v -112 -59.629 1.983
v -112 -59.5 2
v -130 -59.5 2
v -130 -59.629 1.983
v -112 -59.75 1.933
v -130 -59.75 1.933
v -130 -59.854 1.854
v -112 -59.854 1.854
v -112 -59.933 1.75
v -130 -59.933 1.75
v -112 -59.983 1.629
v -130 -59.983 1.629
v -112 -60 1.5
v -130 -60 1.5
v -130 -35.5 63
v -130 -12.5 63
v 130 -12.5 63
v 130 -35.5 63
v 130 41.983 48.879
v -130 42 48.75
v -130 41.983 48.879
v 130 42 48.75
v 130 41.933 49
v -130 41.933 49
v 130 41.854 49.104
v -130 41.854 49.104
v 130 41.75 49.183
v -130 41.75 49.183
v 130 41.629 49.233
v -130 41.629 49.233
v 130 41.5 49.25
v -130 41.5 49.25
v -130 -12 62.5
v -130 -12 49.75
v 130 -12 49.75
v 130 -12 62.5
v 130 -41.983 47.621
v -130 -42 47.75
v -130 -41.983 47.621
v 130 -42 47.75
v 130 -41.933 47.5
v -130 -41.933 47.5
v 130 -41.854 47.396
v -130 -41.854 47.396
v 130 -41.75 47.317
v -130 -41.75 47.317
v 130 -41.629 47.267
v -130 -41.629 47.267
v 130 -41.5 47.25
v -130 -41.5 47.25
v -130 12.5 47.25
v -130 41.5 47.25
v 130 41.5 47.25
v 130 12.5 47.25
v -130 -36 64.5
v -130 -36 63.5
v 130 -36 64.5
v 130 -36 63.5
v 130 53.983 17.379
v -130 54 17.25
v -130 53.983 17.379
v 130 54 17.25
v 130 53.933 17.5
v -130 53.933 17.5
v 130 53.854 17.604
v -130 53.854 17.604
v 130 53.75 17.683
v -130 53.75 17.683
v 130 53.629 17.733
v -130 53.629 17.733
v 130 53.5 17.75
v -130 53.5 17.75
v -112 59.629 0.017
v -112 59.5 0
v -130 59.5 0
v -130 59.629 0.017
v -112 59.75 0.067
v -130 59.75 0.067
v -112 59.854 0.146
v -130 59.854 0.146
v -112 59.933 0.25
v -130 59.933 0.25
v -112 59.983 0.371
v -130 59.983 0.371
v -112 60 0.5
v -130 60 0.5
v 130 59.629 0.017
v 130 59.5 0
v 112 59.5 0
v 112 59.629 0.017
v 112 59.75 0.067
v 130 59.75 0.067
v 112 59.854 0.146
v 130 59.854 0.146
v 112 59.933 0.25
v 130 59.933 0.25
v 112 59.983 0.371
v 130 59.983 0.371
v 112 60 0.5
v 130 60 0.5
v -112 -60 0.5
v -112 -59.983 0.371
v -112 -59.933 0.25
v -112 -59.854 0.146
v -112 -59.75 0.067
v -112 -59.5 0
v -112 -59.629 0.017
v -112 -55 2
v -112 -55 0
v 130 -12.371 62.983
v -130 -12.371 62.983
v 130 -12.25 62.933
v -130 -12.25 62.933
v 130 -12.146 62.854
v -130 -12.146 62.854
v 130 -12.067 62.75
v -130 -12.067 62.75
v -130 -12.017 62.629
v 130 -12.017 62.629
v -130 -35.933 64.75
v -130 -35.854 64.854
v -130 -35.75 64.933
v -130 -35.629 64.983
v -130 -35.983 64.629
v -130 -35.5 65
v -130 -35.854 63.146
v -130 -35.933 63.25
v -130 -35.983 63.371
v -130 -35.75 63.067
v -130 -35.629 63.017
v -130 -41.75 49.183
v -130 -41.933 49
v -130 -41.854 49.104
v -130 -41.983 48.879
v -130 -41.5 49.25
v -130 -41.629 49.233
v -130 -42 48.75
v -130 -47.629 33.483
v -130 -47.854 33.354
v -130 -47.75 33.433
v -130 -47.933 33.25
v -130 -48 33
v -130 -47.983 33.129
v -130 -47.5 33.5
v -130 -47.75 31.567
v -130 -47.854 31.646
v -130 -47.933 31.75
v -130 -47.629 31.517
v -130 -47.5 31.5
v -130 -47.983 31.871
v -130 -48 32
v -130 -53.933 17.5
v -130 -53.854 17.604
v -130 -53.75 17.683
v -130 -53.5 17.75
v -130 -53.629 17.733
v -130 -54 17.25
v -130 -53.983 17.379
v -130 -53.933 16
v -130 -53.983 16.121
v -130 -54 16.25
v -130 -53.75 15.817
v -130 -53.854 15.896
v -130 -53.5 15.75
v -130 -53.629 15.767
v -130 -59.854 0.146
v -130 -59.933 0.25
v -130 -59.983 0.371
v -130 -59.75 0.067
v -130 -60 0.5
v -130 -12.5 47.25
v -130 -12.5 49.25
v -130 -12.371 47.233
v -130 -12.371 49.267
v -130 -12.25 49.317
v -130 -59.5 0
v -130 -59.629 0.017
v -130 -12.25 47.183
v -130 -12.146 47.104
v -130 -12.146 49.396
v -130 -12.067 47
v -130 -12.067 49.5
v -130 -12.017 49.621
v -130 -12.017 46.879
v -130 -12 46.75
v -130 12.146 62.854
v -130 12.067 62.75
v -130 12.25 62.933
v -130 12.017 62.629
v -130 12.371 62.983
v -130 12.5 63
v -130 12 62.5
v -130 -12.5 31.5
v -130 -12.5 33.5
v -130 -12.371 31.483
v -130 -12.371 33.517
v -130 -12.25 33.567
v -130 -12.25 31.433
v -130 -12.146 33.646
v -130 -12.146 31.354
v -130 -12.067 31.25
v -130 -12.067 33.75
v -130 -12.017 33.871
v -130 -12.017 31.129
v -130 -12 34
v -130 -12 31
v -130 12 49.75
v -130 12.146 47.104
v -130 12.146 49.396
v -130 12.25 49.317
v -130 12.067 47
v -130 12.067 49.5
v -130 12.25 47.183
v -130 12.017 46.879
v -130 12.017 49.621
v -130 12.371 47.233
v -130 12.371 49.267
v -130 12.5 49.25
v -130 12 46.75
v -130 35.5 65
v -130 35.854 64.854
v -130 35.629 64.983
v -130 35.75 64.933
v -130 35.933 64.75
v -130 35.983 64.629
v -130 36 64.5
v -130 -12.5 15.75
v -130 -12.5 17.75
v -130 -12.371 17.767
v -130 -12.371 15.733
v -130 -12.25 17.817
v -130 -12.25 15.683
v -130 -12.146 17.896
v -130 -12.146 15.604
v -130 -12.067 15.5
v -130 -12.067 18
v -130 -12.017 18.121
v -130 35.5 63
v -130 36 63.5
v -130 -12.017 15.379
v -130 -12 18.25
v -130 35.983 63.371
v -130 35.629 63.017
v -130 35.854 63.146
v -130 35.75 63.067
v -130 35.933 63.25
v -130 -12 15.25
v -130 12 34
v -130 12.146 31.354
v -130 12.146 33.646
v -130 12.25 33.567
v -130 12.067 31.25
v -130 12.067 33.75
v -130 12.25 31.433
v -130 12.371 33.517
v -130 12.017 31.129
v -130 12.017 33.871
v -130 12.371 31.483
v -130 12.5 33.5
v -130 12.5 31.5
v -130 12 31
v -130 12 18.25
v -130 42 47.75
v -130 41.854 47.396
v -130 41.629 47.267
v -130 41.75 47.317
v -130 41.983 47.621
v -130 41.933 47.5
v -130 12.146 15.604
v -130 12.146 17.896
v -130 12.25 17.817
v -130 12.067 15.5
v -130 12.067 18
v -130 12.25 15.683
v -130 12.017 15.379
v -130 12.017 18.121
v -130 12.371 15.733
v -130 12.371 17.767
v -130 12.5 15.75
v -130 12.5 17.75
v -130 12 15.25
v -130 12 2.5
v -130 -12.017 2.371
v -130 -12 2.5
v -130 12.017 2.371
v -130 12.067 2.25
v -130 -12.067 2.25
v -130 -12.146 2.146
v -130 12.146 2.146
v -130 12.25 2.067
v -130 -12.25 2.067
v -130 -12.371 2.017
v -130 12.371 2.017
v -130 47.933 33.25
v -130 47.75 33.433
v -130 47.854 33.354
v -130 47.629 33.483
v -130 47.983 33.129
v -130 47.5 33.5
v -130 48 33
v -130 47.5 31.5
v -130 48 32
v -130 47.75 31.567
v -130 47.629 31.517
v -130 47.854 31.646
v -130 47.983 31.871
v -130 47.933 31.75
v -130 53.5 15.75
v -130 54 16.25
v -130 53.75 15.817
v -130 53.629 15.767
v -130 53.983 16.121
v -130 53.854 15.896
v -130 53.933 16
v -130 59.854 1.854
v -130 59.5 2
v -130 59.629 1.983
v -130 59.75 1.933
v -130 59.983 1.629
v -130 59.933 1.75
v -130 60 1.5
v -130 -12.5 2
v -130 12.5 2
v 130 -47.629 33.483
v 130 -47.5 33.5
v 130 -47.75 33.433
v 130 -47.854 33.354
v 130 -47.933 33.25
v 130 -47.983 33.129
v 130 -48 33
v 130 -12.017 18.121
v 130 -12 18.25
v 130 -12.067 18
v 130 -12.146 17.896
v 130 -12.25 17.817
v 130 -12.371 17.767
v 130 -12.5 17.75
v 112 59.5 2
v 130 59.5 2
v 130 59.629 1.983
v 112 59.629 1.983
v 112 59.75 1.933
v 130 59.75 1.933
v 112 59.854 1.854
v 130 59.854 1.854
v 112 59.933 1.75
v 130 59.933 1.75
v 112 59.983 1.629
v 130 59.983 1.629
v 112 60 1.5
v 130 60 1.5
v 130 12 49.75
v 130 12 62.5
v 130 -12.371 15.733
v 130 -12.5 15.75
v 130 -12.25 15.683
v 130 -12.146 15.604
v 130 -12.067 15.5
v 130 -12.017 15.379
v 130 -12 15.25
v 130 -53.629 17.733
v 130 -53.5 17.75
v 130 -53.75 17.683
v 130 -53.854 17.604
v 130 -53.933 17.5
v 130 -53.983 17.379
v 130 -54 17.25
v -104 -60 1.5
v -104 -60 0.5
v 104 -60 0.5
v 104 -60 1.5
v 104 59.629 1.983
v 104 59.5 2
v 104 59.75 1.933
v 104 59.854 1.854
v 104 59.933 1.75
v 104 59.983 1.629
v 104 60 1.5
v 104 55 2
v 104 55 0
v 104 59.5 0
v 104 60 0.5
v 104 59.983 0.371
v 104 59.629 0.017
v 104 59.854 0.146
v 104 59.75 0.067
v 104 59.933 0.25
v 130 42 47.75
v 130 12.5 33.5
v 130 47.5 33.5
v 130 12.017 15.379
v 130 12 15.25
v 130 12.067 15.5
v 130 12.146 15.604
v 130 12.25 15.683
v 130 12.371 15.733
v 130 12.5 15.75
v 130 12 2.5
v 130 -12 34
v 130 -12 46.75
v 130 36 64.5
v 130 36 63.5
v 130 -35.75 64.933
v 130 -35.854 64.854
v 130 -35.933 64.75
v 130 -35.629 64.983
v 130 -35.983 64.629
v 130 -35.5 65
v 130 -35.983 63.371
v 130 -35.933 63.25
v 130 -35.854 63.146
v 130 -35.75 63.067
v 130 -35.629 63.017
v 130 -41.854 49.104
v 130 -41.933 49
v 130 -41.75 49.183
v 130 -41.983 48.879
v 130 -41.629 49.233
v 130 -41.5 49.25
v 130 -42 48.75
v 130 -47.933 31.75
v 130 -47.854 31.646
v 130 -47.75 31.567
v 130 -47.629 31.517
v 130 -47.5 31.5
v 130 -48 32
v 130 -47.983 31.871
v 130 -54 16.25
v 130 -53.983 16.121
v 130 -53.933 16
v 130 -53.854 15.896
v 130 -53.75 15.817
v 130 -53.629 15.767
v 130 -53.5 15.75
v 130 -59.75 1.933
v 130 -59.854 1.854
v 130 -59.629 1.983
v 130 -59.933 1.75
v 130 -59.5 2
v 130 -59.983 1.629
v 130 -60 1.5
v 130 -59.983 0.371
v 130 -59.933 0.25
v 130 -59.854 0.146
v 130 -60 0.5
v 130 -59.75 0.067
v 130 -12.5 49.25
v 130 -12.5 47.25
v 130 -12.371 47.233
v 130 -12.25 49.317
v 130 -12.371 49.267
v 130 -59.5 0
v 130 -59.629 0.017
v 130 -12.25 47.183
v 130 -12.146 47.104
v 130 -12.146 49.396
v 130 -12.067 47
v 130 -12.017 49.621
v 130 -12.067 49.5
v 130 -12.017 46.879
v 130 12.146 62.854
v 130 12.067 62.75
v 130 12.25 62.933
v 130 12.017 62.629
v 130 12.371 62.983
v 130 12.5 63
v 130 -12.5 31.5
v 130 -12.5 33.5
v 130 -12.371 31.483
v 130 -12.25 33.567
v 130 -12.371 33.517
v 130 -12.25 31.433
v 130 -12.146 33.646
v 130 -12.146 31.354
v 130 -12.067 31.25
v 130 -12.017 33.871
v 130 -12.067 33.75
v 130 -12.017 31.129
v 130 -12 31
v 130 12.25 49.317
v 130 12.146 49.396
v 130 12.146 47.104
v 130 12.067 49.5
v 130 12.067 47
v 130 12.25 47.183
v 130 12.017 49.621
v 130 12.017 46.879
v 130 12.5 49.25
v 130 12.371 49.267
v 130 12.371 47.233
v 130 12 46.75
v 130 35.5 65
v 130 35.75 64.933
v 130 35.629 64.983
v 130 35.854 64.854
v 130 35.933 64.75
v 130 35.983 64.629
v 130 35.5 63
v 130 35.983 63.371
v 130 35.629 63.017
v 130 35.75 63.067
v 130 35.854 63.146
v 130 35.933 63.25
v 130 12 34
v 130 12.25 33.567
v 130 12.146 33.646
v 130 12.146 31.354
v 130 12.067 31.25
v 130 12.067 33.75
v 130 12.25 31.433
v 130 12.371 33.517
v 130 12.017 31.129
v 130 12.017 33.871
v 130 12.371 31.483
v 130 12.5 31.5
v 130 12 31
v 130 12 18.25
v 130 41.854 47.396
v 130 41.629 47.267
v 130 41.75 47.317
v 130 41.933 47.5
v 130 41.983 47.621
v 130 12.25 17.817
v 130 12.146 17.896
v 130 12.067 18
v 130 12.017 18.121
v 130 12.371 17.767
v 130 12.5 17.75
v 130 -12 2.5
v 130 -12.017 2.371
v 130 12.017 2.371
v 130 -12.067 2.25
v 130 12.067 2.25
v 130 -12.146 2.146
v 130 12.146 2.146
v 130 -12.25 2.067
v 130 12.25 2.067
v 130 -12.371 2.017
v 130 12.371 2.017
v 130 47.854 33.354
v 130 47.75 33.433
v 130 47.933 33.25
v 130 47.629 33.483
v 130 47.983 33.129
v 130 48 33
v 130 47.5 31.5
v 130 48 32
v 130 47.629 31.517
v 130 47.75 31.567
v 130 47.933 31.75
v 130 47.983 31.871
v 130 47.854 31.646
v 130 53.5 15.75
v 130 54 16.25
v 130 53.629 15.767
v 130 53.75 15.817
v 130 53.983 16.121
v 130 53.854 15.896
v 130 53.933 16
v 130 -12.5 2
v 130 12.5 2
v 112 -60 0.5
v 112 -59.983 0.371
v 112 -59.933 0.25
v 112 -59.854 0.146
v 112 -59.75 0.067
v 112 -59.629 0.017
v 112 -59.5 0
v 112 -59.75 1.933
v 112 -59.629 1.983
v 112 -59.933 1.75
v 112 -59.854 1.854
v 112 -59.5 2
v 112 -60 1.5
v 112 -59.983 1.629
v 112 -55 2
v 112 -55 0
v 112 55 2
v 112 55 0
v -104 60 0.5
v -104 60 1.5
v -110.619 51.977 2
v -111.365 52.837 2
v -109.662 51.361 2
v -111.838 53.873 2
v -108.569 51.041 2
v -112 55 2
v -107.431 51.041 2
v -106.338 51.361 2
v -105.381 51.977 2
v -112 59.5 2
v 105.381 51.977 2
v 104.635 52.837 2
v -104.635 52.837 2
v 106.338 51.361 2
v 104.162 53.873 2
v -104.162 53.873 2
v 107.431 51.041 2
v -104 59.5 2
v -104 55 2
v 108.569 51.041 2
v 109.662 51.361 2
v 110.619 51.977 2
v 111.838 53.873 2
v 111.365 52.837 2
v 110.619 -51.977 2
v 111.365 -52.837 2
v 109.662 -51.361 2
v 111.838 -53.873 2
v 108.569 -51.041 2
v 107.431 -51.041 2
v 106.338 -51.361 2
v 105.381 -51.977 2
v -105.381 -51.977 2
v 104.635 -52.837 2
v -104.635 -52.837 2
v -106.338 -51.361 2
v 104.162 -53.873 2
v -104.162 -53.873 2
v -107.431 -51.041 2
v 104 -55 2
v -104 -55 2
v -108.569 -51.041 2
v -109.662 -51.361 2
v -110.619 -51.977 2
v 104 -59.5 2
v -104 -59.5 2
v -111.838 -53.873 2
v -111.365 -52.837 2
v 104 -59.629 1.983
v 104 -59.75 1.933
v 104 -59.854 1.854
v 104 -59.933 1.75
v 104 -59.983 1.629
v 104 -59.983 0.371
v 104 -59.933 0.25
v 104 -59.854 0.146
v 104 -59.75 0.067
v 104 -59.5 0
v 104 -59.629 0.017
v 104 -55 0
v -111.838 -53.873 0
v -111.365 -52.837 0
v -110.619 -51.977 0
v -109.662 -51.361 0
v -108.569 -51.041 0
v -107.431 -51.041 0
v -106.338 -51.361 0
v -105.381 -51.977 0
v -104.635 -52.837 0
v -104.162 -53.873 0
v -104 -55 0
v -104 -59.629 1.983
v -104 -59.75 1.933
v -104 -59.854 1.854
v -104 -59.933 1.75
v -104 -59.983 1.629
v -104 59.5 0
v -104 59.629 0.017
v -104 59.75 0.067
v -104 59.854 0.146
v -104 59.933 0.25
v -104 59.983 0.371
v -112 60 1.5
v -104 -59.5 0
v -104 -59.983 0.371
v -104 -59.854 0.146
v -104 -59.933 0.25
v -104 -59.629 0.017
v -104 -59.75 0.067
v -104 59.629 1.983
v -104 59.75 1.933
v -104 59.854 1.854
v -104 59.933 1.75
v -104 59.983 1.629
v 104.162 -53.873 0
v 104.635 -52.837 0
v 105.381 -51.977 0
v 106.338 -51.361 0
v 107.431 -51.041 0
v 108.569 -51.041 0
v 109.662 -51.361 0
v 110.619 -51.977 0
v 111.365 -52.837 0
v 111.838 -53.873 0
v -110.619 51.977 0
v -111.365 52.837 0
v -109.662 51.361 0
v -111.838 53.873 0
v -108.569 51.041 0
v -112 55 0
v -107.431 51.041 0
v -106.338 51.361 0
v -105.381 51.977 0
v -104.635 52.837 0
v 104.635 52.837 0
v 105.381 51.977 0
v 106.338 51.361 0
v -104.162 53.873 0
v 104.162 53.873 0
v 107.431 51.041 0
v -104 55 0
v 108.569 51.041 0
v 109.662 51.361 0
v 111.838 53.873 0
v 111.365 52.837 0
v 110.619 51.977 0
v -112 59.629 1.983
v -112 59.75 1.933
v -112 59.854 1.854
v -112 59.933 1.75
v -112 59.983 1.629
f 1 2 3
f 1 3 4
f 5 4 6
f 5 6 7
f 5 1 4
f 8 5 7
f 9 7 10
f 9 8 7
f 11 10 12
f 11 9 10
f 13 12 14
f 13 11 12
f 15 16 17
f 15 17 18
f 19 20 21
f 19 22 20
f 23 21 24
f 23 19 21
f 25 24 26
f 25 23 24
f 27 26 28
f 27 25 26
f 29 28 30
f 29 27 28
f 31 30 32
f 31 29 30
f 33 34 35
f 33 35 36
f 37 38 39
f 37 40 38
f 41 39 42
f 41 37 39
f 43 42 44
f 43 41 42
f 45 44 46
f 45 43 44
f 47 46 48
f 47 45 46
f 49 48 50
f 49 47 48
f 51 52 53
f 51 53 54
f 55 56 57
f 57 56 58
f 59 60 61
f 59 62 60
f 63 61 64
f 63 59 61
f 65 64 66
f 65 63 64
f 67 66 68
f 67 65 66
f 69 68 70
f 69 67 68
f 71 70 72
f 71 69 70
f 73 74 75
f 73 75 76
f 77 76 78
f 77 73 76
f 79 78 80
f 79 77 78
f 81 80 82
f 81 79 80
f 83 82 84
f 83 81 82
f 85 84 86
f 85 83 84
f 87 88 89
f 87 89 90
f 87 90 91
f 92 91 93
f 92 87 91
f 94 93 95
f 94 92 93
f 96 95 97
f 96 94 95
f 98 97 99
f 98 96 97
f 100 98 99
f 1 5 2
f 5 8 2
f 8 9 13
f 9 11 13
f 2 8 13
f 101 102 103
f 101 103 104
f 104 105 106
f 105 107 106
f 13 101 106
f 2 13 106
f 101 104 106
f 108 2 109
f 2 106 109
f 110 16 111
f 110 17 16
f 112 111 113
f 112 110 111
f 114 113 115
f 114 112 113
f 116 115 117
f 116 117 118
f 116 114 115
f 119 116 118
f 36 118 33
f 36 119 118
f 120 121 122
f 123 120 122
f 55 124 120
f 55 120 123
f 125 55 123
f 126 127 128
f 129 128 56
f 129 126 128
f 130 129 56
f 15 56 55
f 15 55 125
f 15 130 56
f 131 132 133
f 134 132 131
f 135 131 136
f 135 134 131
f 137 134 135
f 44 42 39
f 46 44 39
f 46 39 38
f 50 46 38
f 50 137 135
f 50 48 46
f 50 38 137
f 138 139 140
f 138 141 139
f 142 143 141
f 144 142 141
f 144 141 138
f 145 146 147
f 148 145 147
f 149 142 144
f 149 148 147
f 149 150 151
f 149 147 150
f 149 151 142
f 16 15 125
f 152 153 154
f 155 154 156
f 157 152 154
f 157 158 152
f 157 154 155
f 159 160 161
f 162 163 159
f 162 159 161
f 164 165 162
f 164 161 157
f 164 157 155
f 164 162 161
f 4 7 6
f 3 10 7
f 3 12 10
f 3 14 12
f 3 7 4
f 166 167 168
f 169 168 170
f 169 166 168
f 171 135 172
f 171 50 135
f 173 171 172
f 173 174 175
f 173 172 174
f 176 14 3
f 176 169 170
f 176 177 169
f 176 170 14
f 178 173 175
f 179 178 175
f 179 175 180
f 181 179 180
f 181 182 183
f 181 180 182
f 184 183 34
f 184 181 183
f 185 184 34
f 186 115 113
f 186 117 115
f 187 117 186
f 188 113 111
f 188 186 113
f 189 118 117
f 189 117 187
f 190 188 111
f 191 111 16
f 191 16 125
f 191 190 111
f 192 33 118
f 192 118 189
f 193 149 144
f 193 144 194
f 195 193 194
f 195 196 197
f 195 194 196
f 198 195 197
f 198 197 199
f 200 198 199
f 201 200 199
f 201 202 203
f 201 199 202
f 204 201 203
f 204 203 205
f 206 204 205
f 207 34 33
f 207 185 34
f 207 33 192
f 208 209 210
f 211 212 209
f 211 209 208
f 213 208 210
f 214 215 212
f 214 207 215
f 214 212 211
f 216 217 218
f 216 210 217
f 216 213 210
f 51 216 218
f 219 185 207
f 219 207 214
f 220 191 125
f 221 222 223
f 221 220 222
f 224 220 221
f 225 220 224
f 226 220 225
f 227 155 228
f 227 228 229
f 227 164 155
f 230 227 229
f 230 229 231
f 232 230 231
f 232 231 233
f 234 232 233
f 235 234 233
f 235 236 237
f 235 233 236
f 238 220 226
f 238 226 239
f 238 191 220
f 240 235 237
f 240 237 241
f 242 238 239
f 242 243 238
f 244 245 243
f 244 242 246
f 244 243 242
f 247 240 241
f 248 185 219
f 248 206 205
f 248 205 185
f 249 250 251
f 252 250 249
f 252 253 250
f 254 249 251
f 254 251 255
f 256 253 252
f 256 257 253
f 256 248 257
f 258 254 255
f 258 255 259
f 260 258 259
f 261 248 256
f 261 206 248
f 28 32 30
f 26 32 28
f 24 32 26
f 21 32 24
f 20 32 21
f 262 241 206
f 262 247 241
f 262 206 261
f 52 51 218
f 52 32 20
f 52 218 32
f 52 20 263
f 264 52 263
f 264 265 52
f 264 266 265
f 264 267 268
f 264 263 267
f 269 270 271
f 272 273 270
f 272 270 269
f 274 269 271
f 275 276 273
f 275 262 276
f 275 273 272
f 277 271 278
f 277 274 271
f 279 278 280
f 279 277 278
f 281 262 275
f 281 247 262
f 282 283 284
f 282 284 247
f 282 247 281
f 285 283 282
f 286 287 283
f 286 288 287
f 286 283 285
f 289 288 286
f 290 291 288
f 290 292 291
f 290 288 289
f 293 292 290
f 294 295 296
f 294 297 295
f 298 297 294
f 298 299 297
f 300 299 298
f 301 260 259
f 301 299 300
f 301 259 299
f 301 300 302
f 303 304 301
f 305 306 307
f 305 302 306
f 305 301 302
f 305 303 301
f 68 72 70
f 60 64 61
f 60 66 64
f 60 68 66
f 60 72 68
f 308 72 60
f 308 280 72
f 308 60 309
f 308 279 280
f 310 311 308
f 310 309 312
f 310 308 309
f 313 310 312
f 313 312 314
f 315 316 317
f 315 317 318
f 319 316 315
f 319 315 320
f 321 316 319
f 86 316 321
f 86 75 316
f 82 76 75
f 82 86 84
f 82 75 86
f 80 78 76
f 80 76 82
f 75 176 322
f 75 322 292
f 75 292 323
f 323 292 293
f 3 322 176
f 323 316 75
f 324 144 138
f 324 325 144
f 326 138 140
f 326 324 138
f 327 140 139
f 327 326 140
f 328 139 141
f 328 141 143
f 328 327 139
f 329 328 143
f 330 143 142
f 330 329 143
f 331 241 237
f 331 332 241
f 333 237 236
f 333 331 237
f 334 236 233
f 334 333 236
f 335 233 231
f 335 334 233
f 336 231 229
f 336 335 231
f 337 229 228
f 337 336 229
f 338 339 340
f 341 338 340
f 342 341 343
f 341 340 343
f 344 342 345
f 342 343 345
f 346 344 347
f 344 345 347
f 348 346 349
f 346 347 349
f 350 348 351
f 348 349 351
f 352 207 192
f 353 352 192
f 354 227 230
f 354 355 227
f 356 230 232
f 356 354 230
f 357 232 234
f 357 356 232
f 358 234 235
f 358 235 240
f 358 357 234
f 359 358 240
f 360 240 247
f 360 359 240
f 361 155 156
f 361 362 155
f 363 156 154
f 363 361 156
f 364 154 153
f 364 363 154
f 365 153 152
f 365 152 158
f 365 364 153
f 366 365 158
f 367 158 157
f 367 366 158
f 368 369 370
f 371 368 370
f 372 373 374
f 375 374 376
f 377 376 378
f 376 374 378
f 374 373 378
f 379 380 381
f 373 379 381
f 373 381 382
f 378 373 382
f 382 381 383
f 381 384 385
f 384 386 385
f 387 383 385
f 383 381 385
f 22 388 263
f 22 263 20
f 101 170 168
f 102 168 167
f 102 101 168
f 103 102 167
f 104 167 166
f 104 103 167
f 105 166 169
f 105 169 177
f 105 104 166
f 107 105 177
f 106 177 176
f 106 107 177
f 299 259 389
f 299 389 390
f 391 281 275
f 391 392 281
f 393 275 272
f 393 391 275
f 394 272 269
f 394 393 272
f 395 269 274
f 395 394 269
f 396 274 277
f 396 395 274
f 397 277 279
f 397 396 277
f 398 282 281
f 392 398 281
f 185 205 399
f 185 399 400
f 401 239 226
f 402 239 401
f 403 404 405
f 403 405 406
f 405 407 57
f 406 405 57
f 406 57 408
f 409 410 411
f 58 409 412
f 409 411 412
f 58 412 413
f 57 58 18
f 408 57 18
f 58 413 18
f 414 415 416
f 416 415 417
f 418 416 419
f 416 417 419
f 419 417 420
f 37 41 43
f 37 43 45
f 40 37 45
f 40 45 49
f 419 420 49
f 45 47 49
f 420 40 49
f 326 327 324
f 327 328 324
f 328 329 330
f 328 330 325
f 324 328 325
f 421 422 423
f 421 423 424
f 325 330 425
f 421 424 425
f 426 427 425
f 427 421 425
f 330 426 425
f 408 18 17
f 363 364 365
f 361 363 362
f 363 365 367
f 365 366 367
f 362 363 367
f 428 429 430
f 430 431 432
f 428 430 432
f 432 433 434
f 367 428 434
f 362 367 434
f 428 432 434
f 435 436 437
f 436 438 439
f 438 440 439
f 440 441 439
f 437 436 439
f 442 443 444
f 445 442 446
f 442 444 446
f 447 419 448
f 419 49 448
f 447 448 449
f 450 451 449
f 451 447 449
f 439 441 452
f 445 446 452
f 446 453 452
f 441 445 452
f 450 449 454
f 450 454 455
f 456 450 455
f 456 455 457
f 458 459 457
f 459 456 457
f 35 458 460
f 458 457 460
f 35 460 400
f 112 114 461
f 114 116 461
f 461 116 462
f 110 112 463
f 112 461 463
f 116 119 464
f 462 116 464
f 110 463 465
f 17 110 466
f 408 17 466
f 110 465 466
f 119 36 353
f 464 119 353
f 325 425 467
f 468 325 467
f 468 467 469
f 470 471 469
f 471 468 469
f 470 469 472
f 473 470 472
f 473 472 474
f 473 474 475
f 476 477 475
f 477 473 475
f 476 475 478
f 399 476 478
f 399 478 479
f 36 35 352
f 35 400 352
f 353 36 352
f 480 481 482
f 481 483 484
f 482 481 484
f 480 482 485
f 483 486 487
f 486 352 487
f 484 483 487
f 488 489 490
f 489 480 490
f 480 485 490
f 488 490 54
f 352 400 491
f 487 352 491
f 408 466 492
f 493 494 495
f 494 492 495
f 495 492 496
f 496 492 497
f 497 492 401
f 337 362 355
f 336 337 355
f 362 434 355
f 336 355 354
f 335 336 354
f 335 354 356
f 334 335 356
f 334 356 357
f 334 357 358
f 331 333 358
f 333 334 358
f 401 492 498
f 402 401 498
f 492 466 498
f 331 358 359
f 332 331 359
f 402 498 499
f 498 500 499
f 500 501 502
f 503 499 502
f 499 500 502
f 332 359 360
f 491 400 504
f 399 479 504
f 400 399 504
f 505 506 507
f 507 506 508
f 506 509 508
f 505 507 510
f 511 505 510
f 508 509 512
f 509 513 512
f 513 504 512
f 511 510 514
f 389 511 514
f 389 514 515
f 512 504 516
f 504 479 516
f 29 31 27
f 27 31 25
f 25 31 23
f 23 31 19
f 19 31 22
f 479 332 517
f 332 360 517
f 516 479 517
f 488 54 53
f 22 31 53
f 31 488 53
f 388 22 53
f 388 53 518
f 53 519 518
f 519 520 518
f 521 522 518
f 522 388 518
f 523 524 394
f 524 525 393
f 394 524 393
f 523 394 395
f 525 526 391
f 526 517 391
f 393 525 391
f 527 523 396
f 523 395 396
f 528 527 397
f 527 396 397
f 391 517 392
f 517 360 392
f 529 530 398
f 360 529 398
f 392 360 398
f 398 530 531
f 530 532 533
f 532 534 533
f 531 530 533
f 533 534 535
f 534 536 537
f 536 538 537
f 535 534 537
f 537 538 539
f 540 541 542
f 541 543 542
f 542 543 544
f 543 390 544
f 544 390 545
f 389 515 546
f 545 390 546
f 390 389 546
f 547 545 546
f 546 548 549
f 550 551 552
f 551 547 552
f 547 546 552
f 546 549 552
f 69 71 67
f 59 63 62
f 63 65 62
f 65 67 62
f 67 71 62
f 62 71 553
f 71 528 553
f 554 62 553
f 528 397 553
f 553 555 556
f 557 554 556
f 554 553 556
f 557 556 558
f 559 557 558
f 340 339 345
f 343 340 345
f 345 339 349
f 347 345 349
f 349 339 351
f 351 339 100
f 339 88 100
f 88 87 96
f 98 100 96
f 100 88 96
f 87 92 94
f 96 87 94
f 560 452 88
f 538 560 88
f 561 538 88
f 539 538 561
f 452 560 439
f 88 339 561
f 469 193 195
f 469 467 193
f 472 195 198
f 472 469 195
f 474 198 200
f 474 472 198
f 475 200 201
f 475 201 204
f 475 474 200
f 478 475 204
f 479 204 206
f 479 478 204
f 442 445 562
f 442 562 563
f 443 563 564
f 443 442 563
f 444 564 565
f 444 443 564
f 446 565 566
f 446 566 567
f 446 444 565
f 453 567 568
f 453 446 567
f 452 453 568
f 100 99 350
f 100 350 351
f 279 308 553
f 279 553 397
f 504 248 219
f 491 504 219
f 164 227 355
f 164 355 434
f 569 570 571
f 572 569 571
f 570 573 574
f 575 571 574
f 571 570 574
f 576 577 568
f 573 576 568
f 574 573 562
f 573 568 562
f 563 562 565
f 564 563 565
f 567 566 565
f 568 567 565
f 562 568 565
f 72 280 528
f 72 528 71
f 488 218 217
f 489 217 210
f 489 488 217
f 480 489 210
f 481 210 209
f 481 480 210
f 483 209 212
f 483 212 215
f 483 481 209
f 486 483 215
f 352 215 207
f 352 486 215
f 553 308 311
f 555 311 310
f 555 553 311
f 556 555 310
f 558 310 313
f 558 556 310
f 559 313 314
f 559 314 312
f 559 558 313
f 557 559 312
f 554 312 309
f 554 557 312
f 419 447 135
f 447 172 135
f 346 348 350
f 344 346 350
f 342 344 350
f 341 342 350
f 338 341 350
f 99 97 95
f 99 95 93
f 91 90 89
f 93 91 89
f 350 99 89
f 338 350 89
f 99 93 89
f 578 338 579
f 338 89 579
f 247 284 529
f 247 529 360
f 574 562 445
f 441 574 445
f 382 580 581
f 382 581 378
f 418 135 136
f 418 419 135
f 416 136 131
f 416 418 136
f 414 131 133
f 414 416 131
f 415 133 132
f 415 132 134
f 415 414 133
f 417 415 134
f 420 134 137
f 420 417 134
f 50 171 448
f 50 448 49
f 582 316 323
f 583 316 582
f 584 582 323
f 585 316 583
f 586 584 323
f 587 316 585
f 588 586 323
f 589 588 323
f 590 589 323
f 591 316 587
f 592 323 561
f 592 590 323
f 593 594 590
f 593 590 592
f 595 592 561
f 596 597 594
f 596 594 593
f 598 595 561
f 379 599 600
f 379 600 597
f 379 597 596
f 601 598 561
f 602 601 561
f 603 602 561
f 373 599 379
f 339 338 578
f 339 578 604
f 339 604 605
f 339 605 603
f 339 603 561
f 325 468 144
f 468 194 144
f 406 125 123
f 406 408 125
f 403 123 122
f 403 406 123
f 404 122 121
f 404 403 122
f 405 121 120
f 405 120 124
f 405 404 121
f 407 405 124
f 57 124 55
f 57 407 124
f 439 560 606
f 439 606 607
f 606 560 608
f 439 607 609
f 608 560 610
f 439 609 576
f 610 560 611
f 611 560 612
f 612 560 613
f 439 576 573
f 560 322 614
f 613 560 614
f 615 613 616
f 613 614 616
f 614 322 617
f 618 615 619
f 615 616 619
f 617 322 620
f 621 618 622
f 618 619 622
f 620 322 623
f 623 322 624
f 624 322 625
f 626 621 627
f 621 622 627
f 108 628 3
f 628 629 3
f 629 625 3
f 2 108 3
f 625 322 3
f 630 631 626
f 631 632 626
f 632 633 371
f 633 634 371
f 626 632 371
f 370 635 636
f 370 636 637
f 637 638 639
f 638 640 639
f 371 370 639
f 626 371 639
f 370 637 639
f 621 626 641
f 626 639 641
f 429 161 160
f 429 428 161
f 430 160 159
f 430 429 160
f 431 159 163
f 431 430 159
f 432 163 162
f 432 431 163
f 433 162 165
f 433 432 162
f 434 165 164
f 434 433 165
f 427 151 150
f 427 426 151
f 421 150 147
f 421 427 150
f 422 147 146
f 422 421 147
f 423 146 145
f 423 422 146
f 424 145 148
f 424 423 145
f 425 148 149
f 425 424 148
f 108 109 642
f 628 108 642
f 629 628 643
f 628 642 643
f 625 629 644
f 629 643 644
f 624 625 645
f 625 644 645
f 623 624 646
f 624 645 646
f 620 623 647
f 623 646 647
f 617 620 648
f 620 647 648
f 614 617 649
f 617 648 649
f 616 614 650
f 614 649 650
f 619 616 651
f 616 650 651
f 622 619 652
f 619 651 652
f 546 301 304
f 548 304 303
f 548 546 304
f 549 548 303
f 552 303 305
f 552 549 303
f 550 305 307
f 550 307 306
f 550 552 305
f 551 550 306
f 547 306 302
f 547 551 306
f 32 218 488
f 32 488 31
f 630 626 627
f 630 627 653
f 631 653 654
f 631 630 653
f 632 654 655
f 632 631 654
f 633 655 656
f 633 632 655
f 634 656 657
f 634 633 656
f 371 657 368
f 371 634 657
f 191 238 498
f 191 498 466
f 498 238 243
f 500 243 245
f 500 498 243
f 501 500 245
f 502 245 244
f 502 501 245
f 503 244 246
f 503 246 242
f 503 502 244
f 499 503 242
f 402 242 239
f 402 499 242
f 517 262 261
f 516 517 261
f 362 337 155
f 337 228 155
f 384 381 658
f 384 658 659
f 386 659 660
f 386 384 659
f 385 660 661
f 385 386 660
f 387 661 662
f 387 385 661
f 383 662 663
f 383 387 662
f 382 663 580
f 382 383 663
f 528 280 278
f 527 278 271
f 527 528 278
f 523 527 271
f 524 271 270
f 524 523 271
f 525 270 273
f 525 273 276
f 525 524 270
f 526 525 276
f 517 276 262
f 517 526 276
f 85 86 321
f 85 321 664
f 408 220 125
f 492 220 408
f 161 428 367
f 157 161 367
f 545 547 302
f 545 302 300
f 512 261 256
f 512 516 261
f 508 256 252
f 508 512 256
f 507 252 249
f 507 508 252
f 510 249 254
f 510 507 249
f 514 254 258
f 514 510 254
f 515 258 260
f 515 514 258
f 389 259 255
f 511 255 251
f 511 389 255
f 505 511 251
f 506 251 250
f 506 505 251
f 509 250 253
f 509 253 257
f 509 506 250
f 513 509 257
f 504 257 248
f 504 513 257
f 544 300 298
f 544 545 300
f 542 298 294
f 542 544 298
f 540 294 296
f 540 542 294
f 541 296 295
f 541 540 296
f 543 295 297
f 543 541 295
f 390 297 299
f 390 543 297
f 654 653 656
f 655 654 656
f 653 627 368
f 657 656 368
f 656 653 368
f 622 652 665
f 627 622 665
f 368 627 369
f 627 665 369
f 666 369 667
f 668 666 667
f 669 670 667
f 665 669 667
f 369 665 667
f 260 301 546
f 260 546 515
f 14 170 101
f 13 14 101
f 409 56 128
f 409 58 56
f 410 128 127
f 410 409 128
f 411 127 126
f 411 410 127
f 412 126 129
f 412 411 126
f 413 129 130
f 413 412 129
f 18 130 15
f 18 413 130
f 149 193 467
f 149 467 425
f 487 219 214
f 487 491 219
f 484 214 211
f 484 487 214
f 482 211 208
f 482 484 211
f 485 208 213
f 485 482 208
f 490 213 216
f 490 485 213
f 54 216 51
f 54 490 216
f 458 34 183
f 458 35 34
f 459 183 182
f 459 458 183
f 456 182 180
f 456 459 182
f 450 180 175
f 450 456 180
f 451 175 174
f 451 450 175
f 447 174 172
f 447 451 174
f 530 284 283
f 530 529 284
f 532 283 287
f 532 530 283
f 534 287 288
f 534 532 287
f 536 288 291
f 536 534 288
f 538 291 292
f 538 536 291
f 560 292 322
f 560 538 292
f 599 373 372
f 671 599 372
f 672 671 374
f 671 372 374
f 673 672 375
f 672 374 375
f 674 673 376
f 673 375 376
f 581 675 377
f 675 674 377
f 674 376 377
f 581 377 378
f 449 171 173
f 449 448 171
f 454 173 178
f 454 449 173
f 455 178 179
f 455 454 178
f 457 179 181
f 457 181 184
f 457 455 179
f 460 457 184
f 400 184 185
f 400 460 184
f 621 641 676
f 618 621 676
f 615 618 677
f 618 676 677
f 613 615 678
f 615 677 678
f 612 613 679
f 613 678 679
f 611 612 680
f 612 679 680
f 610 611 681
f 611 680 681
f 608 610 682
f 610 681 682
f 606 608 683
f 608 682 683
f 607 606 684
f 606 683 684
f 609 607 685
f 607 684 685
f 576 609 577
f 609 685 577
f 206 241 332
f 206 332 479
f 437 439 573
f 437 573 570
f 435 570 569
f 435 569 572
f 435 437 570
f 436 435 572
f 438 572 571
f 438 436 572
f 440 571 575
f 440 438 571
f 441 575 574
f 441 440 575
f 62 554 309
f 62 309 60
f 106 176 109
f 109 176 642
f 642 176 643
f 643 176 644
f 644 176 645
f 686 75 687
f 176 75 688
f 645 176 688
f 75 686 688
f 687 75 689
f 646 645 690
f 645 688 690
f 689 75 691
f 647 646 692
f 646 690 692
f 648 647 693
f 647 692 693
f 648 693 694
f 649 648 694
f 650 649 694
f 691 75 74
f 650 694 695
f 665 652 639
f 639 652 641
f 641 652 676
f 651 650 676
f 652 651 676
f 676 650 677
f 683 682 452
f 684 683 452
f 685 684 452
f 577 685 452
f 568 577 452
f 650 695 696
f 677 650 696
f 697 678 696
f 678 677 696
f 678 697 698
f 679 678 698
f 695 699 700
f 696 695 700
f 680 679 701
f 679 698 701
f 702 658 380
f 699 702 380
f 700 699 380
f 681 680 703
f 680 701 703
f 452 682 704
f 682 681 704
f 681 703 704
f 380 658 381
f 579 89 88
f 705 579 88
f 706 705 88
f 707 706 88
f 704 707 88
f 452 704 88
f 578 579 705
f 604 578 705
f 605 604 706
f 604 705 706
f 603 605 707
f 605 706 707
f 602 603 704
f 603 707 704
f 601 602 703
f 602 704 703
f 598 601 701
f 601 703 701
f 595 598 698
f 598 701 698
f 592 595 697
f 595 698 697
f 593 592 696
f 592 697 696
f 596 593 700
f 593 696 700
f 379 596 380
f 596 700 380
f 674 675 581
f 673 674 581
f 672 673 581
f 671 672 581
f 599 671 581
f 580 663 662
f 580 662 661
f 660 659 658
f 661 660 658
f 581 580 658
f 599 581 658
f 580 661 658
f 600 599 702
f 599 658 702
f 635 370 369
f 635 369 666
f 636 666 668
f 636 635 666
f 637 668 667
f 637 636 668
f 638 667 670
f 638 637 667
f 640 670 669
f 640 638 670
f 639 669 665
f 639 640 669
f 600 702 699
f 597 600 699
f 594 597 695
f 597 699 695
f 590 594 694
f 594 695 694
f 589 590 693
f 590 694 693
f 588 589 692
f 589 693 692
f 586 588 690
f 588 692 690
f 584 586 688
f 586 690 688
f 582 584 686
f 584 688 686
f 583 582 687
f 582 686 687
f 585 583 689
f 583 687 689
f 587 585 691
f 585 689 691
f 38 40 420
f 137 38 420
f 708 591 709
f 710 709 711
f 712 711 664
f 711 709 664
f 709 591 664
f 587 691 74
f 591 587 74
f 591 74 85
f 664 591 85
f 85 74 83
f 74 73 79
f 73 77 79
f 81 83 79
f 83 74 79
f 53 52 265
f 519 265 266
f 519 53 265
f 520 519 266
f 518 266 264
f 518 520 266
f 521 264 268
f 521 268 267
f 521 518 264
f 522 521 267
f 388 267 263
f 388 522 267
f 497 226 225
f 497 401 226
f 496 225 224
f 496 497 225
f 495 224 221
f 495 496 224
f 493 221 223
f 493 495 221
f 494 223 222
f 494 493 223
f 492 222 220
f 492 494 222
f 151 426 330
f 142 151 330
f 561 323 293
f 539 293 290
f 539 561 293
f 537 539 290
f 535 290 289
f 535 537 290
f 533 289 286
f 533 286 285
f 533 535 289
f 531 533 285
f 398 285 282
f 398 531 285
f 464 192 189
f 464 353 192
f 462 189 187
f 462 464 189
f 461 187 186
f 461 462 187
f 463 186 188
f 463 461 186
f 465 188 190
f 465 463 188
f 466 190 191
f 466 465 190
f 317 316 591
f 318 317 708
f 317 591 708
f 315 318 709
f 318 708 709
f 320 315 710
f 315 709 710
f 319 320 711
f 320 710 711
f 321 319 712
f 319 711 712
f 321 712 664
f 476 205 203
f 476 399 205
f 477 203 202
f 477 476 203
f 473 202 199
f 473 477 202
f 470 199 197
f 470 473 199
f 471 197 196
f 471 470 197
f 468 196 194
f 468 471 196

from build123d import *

# Parameters (mm, degrees)
F0_W     = 260
F0_H     = 24
F1_DEPTH = 65
F2_DEPTH = 2
F3_W     = 12
F3_H     = 2
F3_W_2   = 6
F3_W_3   = 18
F4_DEPTH = 260
F3_W_4   = 24
F3_H_2   = 13.75
F5_DEPTH = 260
F6_R     = 0.5
F7_W     = 8
F7_H     = 0.5
F7_H_2   = 4.5
F8_DEPTH = 2


# Not quite as in the source:
# - a feature names something its author has since deleted; it is built from what else it names


with BuildPart() as f1:
    # F0 (on Top) → F1 (new body)
    with BuildSketch(Plane.XY):
        with Locations((0, -24)):
            Rectangle(F0_W, F0_H)
        Rectangle(F0_W, F0_H)
        with Locations((0, 24)):
            Rectangle(F0_W, F0_H)
    extrude(amount=F1_DEPTH)

    # F0 (on Top) → F2 (join)
    with BuildSketch(Plane.XY):
        with Locations((0, -48)):
            Rectangle(F0_W, F0_H)
        with Locations((0, 48)):
            Rectangle(F0_W, F0_H)
    extrude(amount=F2_DEPTH)

    # F3 (on face) → F4 (join)
    with BuildSketch(Plane(origin=(-130, 0, 0), x_dir=(0, -1, 0), z_dir=(-1, 0, 0))):
        Polygon((36, 65), (0, 65), (0, 0), (60, 0), (60, 2), (36, 2), (12, 2), (12, 15.75), (36, 15.75), (36, 17.75), (12, 17.75), (12, 31.5), (36, 31.5), (36, 33.5), (12, 33.5), (12, 47.25), (36, 47.25), (36, 49.25), (12, 49.25), (12, 63), (36, 63), align=None)
        Polygon((0, 65), (-36, 65), (-36, 63), (-12, 63), (-12, 49.25), (-36, 49.25), (-36, 47.25), (-12, 47.25), (-12, 33.5), (-36, 33.5), (-36, 31.5), (-12, 31.5), (-12, 17.75), (-36, 17.75), (-36, 15.75), (-12, 15.75), (-12, 2), (-36, 2), (-60, 2), (-60, 0), (0, 0), align=None)
        with Locations((-42, 32.5)):
            Rectangle(F3_W, F3_H)
        with Locations((-39, 48.25)):
            Rectangle(F3_W_2, F3_H)
        with Locations((-45, 16.75)):
            Rectangle(F3_W_3, F3_H)
        with Locations((45, 16.75)):
            Rectangle(F3_W_3, F3_H)
        with Locations((42, 32.5)):
            Rectangle(F3_W, F3_H)
        with Locations((39, 48.25)):
            Rectangle(F3_W_2, F3_H)
    extrude(amount=-F4_DEPTH)

    # F3 (on face) → F5 (cut)
    with BuildSketch(Plane(origin=(-130, 0, 0), x_dir=(0, -1, 0), z_dir=(-1, 0, 0))):
        with Locations((-24, 8.875)):
            Rectangle(F3_W_4, F3_H_2)
        with Locations((-24, 56.125)):
            Rectangle(F3_W_4, F3_H_2)
        with Locations((-24, 40.375)):
            Rectangle(F3_W_4, F3_H_2)
        with Locations((-24, 24.625)):
            Rectangle(F3_W_4, F3_H_2)
        with Locations((24, 8.875)):
            Rectangle(F3_W_4, F3_H_2)
        with Locations((24, 24.625)):
            Rectangle(F3_W_4, F3_H_2)
        with Locations((24, 40.375)):
            Rectangle(F3_W_4, F3_H_2)
        with Locations((24, 56.125)):
            Rectangle(F3_W_4, F3_H_2)
    extrude(amount=-F5_DEPTH, mode=Mode.SUBTRACT)

    # F6
    f6_edges = [f1.edges().sort_by_distance(p)[0] for p in [
        (0, 36, 65),
        (0, 36, 63),
        (0, 48, 33.5),
        (0, 48, 31.5),
        (0, 54, 17.75),
        (0, 54, 15.75),
        (0, 60, 0),
        (0, 60, 2),
        (0, -60, 2),
        (0, -54, 17.75),
        (0, -48, 33.5),
        (0, -42, 49.25),
        (0, -36, 65),
        (0, -60, 0),
        (0, -54, 15.75),
        (0, -48, 31.5),
        (0, -42, 47.25),
        (0, -36, 63),
        (0, 12, 63),
        (0, 12, 49.25),
        (0, 12, 33.5),
        (0, 12, 47.25),
        (0, 12, 31.5),
        (0, 12, 15.75),
        (0, 12, 2),
        (0, -12, 63),
        (0, -12, 47.25),
        (0, -12, 31.5),
        (0, -12, 49.25),
        (0, -12, 33.5),
        (0, -12, 15.75),
        (0, -12, 17.75),
        (0, 42, 49.25),
        (0, 12, 17.75),
        (0, -12, 2),
        (0, 42, 47.25),
    ]]
    fillet(f6_edges, radius=F6_R)

    # F7 (on face) → F8 (cut)
    with BuildSketch(Plane(origin=(0, 0, 0), x_dir=(1, 0, 0), z_dir=(0, 0, -1))):
        with Locations((-108, -59.75)):
            Rectangle(F7_W, F7_H)
        with Locations((-108, -57.25)):
            Rectangle(F7_W, F7_H_2)
        with BuildLine():
            ThreePointArc((-104, -55), (-108, -51), (-112, -55))
            Line((-112, -55), (-104, -55))
        make_face()
        with Locations((-108, 59.75)):
            Rectangle(F7_W, F7_H)
        with BuildLine():
            Line((-104, 55), (-112, 55))
            ThreePointArc((-112, 55), (-108, 51), (-104, 55))
        make_face()
        with Locations((108, -59.75)):
            Rectangle(F7_W, F7_H)
        with Locations((108, -57.25)):
            Rectangle(F7_W, F7_H_2)
        with BuildLine():
            ThreePointArc((112, -55), (108, -51), (104, -55))
            Line((104, -55), (112, -55))
        make_face()
        with BuildLine():
            Line((112, 55), (104, 55))
            ThreePointArc((104, 55), (108, 51), (112, 55))
        make_face()
        with Locations((108, 59.75)):
            Rectangle(F7_W, F7_H)
        with Locations((108, 57.25)):
            Rectangle(F7_W, F7_H_2)
        with Locations((-108, 57.25)):
            Rectangle(F7_W, F7_H_2)
    extrude(amount=-F8_DEPTH, mode=Mode.SUBTRACT)


solid = f1.part
